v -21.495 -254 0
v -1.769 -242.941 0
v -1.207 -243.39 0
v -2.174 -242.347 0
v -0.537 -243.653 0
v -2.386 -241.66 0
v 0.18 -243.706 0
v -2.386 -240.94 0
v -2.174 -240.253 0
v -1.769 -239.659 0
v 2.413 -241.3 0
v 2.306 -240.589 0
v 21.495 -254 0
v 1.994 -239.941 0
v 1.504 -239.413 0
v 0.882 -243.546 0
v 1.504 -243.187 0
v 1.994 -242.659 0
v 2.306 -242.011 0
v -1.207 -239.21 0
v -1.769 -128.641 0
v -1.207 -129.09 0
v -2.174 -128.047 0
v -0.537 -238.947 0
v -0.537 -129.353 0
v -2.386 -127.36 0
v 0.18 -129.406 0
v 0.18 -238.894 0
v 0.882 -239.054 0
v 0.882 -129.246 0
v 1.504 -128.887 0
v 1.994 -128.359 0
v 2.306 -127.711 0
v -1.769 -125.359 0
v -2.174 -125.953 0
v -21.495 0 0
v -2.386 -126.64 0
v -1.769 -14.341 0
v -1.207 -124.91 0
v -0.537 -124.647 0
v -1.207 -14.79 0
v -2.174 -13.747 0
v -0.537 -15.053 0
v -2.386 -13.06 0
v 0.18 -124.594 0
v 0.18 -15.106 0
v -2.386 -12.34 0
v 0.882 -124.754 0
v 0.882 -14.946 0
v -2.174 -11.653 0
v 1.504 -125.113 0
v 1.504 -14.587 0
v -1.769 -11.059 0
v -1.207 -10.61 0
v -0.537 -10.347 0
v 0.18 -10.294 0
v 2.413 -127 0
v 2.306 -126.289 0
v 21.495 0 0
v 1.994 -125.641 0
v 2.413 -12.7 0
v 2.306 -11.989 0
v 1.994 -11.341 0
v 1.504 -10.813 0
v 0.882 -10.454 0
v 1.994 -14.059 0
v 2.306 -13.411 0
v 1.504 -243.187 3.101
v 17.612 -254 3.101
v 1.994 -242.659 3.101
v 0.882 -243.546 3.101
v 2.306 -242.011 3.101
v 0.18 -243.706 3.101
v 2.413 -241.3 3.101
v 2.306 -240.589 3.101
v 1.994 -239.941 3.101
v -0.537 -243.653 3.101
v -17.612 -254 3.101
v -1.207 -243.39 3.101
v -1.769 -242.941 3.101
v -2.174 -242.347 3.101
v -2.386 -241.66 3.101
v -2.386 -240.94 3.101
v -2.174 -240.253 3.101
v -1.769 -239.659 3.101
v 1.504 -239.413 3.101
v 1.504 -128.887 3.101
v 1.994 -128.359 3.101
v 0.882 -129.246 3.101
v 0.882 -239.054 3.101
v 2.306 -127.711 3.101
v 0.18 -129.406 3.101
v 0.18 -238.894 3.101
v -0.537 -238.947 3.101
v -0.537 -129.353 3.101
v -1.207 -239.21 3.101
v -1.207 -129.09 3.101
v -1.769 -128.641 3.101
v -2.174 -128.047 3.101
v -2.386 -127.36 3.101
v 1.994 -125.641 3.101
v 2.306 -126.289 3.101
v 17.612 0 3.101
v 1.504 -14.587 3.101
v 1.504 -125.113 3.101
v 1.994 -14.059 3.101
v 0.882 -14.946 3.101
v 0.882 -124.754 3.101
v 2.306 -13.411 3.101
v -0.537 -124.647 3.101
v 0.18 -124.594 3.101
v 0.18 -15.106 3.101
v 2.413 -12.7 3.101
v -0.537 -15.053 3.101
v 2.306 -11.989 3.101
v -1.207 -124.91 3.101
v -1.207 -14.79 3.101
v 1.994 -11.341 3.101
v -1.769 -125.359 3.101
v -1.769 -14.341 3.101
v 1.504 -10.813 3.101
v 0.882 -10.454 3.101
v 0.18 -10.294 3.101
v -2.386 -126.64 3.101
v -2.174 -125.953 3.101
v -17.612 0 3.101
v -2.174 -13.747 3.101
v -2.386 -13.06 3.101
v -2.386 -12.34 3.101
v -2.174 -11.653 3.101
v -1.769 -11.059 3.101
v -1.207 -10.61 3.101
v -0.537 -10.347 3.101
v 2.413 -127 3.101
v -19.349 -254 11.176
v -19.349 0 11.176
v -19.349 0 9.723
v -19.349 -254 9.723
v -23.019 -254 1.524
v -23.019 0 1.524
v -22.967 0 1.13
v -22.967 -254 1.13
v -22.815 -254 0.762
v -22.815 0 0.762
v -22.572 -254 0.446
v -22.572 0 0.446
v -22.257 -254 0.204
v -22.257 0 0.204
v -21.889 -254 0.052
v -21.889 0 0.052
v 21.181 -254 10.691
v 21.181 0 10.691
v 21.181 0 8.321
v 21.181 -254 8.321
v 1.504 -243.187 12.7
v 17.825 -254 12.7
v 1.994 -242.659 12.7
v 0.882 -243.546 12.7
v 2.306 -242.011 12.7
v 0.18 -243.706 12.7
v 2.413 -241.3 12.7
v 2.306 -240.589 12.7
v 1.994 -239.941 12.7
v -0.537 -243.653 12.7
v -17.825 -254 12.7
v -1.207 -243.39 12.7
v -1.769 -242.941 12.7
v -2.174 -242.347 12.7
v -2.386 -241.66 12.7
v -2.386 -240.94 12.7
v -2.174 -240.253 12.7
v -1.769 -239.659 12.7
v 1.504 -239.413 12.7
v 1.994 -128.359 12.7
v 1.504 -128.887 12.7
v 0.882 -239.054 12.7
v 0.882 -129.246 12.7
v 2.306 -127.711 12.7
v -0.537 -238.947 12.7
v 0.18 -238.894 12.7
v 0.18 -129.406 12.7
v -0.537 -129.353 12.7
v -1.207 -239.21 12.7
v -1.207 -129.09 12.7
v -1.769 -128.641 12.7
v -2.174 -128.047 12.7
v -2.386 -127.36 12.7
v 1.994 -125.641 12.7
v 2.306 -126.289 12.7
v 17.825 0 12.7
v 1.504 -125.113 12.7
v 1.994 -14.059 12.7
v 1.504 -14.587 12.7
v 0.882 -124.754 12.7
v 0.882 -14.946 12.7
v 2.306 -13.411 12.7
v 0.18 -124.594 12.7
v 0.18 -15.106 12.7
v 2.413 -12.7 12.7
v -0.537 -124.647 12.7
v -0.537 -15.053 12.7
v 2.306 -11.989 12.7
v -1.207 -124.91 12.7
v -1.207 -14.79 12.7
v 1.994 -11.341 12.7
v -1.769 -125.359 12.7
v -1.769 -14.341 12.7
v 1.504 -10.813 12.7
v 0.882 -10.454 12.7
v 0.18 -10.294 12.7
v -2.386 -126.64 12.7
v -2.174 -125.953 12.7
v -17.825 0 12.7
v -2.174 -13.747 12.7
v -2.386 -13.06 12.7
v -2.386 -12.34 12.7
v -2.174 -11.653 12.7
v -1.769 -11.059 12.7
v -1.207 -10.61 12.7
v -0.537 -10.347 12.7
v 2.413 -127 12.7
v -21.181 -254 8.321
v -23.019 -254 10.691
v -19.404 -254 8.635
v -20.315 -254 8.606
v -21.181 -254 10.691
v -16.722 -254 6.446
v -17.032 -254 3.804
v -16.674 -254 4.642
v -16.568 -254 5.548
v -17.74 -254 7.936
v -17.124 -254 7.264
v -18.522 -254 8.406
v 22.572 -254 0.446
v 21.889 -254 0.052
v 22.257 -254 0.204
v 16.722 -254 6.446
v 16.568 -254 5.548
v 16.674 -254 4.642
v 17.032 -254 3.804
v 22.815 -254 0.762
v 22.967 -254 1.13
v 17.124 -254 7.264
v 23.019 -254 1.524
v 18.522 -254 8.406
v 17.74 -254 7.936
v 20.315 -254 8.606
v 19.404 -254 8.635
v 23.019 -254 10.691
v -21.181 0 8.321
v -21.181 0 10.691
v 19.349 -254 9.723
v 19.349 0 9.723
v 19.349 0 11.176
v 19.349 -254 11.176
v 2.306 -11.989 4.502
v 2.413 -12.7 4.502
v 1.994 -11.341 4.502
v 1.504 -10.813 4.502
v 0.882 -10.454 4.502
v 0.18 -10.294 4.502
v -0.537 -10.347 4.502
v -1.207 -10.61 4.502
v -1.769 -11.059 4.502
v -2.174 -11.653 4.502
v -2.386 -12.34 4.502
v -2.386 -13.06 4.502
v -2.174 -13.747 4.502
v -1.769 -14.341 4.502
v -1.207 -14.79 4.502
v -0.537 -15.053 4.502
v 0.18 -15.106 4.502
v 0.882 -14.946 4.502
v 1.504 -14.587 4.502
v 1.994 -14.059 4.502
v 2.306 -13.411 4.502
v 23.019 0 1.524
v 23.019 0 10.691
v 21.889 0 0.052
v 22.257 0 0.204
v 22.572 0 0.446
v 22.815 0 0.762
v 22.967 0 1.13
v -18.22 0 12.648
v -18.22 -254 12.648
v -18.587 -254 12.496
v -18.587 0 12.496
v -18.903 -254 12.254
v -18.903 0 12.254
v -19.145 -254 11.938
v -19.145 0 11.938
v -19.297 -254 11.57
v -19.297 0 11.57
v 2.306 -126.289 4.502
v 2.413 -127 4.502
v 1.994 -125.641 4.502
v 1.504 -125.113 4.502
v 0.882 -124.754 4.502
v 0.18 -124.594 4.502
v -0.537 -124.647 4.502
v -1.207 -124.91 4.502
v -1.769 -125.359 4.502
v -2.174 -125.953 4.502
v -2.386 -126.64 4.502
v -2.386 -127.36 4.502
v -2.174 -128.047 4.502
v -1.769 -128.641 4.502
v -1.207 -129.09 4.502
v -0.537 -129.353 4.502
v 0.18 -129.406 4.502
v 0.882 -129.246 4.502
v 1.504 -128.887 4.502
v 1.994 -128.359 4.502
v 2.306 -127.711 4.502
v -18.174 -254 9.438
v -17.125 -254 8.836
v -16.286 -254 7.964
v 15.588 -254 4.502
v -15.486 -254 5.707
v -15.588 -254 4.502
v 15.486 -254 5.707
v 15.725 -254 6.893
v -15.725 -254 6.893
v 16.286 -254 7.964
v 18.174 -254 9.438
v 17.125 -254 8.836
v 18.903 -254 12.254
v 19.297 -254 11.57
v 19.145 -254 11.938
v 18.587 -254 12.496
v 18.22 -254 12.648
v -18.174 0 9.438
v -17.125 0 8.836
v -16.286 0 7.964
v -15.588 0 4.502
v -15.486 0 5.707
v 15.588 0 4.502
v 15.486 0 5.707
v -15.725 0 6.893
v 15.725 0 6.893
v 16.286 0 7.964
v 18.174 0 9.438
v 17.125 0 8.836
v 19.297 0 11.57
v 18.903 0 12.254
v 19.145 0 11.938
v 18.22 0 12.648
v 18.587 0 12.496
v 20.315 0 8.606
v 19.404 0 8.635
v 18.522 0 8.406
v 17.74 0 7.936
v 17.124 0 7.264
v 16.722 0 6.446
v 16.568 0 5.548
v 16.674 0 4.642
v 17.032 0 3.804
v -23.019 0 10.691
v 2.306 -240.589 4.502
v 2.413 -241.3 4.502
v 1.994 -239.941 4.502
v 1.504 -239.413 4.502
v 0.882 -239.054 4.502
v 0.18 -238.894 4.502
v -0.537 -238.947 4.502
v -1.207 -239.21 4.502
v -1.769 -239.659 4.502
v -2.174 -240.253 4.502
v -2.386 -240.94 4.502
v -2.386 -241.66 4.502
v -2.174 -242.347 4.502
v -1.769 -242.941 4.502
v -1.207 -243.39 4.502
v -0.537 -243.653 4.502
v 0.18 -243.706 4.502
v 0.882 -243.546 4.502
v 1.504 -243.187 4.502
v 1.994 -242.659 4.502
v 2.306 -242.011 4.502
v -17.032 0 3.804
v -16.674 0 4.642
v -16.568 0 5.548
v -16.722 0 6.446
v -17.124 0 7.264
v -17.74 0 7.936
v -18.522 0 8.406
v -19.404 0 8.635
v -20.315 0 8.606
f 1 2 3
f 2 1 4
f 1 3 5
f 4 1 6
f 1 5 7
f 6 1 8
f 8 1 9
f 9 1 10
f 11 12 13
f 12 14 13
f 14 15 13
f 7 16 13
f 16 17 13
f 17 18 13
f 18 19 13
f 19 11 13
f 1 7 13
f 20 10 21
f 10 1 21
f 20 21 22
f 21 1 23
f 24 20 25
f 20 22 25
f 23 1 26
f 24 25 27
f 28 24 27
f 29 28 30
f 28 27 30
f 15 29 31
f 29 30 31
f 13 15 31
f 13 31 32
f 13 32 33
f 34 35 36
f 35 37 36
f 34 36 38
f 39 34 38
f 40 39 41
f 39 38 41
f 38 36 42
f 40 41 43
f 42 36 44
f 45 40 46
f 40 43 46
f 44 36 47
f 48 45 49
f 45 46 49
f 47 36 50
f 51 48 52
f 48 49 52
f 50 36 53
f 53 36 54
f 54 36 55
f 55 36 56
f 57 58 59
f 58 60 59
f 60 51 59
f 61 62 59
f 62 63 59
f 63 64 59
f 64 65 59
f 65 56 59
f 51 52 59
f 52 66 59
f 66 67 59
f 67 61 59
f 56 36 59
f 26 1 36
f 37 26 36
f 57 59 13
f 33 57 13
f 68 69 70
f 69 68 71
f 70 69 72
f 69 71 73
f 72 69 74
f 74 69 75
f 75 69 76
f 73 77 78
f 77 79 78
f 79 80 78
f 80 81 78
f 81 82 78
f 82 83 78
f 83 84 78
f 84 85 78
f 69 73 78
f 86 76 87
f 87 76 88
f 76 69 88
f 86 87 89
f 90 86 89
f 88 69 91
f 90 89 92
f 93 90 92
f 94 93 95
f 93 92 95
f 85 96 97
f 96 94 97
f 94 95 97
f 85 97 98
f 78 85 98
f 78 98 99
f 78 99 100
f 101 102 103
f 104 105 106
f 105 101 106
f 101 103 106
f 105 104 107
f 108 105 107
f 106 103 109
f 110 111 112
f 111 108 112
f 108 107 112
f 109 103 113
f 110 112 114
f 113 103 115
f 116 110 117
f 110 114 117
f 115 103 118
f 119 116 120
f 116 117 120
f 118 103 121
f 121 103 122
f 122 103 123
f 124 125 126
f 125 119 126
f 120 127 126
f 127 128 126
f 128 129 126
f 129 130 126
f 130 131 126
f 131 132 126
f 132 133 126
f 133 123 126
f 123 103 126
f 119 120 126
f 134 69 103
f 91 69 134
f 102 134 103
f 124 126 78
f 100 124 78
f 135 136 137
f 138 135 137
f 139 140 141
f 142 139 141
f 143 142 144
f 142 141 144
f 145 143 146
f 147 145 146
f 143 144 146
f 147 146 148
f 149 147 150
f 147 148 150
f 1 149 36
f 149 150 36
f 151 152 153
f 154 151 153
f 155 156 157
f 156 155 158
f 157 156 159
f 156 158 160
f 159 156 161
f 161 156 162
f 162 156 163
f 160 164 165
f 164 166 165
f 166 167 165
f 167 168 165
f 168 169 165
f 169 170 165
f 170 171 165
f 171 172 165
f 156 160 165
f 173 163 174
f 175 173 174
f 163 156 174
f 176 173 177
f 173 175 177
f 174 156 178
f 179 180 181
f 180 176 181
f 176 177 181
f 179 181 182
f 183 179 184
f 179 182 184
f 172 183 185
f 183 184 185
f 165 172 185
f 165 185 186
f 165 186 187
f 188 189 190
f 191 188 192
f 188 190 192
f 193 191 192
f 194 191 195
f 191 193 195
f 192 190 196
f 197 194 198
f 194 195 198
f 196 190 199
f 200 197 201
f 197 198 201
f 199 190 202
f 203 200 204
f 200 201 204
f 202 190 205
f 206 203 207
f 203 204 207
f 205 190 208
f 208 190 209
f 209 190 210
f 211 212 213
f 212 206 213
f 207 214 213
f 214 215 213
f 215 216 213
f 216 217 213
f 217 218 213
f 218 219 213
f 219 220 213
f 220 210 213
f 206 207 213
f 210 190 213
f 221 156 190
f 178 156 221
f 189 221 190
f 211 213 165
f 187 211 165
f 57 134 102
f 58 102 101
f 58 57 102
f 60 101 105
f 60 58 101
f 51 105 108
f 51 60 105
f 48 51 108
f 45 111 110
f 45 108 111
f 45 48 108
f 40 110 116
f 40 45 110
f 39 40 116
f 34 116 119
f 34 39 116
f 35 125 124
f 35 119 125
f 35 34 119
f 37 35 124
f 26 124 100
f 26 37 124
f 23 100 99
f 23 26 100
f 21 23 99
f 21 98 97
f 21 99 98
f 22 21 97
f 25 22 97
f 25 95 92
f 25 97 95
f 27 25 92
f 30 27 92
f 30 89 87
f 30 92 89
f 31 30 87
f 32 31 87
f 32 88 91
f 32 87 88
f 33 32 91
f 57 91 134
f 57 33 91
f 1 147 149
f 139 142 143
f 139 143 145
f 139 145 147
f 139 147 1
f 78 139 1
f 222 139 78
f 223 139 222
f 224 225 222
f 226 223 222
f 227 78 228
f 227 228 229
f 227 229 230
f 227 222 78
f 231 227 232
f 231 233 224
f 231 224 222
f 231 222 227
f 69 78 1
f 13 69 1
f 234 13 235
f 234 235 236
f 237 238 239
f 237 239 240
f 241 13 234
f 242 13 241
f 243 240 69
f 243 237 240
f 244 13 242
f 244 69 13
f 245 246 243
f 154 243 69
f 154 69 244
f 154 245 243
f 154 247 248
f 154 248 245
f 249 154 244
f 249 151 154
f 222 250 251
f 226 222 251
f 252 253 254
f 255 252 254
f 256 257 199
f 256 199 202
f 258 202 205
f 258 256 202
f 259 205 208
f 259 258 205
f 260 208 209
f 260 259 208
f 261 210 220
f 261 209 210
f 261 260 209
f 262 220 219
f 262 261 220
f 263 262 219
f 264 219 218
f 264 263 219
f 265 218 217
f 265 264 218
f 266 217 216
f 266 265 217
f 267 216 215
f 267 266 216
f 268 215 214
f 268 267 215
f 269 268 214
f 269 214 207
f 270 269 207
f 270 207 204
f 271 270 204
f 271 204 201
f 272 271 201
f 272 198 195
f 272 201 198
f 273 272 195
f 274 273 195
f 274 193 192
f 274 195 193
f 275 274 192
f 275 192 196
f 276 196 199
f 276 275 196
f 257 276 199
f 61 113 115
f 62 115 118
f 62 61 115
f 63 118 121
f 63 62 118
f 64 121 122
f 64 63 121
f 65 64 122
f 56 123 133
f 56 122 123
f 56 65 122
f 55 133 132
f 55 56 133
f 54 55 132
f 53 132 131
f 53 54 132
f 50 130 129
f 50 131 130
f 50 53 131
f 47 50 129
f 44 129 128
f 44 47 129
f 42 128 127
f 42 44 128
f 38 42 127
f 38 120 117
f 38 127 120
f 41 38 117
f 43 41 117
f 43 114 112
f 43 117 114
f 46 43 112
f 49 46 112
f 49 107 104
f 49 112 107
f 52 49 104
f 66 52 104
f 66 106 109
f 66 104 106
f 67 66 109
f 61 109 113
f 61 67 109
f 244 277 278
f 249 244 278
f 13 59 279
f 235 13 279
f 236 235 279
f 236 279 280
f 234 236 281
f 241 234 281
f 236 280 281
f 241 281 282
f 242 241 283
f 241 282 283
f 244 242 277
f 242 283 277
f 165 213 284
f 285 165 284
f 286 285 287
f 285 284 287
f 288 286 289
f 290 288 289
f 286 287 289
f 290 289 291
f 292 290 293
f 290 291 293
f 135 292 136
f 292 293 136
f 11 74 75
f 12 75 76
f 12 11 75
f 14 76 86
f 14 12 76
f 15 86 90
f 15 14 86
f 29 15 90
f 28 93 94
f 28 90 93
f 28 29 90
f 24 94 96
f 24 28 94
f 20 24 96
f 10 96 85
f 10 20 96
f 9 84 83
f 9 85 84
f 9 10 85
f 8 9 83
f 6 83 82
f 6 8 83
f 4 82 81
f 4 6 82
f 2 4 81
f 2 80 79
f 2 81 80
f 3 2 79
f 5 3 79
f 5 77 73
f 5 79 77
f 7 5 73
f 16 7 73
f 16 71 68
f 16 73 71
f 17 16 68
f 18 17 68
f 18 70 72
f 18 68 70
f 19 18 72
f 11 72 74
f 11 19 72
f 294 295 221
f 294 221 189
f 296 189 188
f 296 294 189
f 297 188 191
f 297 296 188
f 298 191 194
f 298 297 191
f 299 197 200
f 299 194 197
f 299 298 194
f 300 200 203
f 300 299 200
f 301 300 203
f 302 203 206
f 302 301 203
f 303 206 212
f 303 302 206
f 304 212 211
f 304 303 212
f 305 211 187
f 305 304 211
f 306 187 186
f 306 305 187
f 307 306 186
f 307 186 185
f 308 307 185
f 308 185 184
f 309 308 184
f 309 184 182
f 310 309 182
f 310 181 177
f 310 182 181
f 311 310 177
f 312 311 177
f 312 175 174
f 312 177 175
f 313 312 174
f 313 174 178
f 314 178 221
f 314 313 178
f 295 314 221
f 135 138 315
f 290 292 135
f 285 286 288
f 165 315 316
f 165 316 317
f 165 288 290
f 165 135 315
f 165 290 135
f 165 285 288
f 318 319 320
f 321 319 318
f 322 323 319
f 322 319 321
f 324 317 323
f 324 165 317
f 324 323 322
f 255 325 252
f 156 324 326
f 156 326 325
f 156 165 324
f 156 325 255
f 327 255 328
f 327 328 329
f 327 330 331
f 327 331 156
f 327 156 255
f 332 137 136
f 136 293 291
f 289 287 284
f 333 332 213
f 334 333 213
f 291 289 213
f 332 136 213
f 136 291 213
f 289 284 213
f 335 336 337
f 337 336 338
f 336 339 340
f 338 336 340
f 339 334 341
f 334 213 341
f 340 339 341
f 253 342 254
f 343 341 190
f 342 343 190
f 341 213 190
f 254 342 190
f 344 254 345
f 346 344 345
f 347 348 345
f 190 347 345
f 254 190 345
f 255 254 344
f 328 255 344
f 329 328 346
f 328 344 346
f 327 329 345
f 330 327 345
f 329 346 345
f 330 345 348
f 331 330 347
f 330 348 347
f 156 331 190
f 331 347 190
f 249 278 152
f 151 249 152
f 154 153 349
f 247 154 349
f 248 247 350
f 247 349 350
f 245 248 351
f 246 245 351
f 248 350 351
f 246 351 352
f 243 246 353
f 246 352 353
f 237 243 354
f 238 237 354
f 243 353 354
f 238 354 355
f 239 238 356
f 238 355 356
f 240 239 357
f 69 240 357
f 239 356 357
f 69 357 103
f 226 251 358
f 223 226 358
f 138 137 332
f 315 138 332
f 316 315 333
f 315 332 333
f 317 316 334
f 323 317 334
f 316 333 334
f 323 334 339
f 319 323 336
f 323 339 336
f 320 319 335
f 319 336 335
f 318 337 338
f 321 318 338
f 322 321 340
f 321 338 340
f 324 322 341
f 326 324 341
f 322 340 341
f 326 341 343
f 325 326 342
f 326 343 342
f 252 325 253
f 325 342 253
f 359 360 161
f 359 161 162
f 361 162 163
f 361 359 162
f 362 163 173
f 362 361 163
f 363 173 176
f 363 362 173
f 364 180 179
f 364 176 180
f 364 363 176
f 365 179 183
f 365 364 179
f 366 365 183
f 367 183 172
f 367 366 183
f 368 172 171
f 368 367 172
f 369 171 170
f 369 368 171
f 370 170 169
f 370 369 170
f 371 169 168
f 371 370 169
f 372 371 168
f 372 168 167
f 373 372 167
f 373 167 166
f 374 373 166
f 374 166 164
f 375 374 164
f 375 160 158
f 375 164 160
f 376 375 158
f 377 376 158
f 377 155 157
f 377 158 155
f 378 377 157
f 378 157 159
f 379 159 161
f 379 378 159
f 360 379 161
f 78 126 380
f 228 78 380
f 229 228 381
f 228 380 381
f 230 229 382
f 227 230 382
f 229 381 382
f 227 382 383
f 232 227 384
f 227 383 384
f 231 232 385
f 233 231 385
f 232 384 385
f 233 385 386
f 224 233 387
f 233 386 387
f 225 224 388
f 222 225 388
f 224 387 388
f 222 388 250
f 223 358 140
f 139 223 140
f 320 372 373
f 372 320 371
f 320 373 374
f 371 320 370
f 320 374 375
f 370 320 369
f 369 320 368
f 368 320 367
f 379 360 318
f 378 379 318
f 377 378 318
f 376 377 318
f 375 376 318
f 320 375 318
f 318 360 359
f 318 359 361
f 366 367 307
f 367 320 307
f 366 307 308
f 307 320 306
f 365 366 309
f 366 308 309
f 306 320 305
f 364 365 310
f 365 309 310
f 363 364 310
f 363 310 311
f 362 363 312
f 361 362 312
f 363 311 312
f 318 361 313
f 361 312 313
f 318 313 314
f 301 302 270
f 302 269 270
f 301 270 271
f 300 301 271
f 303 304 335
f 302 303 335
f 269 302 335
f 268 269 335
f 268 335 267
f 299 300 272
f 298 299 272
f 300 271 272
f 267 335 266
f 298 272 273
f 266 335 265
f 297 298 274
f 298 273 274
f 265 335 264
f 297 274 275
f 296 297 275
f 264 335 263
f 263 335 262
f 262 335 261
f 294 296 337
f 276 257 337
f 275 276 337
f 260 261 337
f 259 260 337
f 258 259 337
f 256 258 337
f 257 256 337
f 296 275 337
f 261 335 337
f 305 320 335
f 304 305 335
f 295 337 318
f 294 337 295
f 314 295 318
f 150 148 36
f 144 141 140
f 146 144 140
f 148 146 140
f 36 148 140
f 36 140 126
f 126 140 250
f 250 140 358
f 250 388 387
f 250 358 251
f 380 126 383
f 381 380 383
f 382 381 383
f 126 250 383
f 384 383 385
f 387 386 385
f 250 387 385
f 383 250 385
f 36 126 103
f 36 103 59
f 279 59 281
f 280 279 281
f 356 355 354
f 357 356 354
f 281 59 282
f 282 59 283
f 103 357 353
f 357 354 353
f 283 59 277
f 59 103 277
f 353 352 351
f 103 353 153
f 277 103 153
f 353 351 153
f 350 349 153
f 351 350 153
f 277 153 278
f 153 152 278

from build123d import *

# Parameters (mm, degrees)
F1_DEPTH      = 254
F2_R          = 2.413
F3_DEPTH      = 386
F3_DEPTH_BACK = 12.701


# Not quite as in the source:
# - an extrude ends at something that could not be found from the text; its depth is read off the source's solid


with BuildPart() as f1:
    # F0 (on Front) → F1 (new body)
    with BuildSketch(Plane.XZ):
        with BuildLine():
            Line((-21.180855953, 10.6905996799), (-23.01875, 10.6905996799))
            Line((-23.01875, 10.6905996799), (-23.01875, 1.524))
            ThreePointArc((-23.01875, 1.524), (-22.5723807345, 0.4463692655), (-21.49475, 0))
            Line((-21.49475, 0), (21.49475, 0))
            ThreePointArc((21.49475, 0), (22.5723807345, 0.4463692655), (23.01875, 1.524))
            Line((23.01875, 1.524), (23.01875, 10.6905996799))
            Line((23.01875, 10.6905996799), (21.180855953, 10.6905996799))
            Line((21.180855953, 10.6905996799), (21.180855953, 8.3211223024))
            ThreePointArc((21.180855953, 8.3211223024), (17.1238073852, 7.2644445689), (17.6117553886, 3.1005380306))
            Line((17.6117553886, 3.1005380306), (-17.6117553886, 3.1005380306))
            ThreePointArc((-17.6117553886, 3.1005380306), (-17.1238073852, 7.2644445689), (-21.180855953, 8.3211223024))
            Line((-21.180855953, 8.3211223024), (-21.180855953, 10.6905996799))
        make_face()
    extrude(amount=F1_DEPTH)


with BuildPart() as f1b:
    # F0 (on Front) → F1, piece 2 (new body)
    with BuildSketch(Plane.XZ):
        with BuildLine():
            ThreePointArc((-19.3494111094, 9.7232580064), (-16.2862756718, 7.9644871947), (-15.5882310877, 4.5020014929))
            Line((-15.5882310877, 4.5020014929), (15.5882310877, 4.5020014929))
            ThreePointArc((15.5882310877, 4.5020014929), (16.2862756718, 7.9644871947), (19.3494111094, 9.7232580064))
            Line((19.3494111094, 9.7232580064), (19.3494111094, 11.176))
            ThreePointArc((19.3494111094, 11.176), (18.9030418439, 12.2536307345), (17.8254111094, 12.7))
            Line((17.8254111094, 12.7), (-17.8254111094, 12.7))
            ThreePointArc((-17.8254111094, 12.7), (-18.9030418439, 12.2536307345), (-19.3494111094, 11.176))
            Line((-19.3494111094, 11.176), (-19.3494111094, 9.7232580064))
        make_face()
    extrude(amount=F1_DEPTH)


with BuildPart() as f3_tool:
    # F2 (on Top) → F3 (new body, two sides)
    with BuildSketch(Plane.XY) as f3_sk:
        with Locations((0, -12.7)):
            Circle(F2_R)
        with Locations((0, -127)):
            Circle(F2_R)
        with Locations((0, -241.3)):
            Circle(F2_R)
    extrude(amount=-F3_DEPTH)
    extrude(f3_sk.sketch, amount=F3_DEPTH_BACK)


with BuildPart() as f1_1:
    add(f1.part)

    # F3: cut by f3_tool
    add(f3_tool.part, mode=Mode.SUBTRACT)


with BuildPart() as f1b_1:
    add(f1b.part)

    # F3: cut by f3_tool
    add(f3_tool.part, mode=Mode.SUBTRACT)


solid = Compound([f1_1.part, f1b_1.part])
